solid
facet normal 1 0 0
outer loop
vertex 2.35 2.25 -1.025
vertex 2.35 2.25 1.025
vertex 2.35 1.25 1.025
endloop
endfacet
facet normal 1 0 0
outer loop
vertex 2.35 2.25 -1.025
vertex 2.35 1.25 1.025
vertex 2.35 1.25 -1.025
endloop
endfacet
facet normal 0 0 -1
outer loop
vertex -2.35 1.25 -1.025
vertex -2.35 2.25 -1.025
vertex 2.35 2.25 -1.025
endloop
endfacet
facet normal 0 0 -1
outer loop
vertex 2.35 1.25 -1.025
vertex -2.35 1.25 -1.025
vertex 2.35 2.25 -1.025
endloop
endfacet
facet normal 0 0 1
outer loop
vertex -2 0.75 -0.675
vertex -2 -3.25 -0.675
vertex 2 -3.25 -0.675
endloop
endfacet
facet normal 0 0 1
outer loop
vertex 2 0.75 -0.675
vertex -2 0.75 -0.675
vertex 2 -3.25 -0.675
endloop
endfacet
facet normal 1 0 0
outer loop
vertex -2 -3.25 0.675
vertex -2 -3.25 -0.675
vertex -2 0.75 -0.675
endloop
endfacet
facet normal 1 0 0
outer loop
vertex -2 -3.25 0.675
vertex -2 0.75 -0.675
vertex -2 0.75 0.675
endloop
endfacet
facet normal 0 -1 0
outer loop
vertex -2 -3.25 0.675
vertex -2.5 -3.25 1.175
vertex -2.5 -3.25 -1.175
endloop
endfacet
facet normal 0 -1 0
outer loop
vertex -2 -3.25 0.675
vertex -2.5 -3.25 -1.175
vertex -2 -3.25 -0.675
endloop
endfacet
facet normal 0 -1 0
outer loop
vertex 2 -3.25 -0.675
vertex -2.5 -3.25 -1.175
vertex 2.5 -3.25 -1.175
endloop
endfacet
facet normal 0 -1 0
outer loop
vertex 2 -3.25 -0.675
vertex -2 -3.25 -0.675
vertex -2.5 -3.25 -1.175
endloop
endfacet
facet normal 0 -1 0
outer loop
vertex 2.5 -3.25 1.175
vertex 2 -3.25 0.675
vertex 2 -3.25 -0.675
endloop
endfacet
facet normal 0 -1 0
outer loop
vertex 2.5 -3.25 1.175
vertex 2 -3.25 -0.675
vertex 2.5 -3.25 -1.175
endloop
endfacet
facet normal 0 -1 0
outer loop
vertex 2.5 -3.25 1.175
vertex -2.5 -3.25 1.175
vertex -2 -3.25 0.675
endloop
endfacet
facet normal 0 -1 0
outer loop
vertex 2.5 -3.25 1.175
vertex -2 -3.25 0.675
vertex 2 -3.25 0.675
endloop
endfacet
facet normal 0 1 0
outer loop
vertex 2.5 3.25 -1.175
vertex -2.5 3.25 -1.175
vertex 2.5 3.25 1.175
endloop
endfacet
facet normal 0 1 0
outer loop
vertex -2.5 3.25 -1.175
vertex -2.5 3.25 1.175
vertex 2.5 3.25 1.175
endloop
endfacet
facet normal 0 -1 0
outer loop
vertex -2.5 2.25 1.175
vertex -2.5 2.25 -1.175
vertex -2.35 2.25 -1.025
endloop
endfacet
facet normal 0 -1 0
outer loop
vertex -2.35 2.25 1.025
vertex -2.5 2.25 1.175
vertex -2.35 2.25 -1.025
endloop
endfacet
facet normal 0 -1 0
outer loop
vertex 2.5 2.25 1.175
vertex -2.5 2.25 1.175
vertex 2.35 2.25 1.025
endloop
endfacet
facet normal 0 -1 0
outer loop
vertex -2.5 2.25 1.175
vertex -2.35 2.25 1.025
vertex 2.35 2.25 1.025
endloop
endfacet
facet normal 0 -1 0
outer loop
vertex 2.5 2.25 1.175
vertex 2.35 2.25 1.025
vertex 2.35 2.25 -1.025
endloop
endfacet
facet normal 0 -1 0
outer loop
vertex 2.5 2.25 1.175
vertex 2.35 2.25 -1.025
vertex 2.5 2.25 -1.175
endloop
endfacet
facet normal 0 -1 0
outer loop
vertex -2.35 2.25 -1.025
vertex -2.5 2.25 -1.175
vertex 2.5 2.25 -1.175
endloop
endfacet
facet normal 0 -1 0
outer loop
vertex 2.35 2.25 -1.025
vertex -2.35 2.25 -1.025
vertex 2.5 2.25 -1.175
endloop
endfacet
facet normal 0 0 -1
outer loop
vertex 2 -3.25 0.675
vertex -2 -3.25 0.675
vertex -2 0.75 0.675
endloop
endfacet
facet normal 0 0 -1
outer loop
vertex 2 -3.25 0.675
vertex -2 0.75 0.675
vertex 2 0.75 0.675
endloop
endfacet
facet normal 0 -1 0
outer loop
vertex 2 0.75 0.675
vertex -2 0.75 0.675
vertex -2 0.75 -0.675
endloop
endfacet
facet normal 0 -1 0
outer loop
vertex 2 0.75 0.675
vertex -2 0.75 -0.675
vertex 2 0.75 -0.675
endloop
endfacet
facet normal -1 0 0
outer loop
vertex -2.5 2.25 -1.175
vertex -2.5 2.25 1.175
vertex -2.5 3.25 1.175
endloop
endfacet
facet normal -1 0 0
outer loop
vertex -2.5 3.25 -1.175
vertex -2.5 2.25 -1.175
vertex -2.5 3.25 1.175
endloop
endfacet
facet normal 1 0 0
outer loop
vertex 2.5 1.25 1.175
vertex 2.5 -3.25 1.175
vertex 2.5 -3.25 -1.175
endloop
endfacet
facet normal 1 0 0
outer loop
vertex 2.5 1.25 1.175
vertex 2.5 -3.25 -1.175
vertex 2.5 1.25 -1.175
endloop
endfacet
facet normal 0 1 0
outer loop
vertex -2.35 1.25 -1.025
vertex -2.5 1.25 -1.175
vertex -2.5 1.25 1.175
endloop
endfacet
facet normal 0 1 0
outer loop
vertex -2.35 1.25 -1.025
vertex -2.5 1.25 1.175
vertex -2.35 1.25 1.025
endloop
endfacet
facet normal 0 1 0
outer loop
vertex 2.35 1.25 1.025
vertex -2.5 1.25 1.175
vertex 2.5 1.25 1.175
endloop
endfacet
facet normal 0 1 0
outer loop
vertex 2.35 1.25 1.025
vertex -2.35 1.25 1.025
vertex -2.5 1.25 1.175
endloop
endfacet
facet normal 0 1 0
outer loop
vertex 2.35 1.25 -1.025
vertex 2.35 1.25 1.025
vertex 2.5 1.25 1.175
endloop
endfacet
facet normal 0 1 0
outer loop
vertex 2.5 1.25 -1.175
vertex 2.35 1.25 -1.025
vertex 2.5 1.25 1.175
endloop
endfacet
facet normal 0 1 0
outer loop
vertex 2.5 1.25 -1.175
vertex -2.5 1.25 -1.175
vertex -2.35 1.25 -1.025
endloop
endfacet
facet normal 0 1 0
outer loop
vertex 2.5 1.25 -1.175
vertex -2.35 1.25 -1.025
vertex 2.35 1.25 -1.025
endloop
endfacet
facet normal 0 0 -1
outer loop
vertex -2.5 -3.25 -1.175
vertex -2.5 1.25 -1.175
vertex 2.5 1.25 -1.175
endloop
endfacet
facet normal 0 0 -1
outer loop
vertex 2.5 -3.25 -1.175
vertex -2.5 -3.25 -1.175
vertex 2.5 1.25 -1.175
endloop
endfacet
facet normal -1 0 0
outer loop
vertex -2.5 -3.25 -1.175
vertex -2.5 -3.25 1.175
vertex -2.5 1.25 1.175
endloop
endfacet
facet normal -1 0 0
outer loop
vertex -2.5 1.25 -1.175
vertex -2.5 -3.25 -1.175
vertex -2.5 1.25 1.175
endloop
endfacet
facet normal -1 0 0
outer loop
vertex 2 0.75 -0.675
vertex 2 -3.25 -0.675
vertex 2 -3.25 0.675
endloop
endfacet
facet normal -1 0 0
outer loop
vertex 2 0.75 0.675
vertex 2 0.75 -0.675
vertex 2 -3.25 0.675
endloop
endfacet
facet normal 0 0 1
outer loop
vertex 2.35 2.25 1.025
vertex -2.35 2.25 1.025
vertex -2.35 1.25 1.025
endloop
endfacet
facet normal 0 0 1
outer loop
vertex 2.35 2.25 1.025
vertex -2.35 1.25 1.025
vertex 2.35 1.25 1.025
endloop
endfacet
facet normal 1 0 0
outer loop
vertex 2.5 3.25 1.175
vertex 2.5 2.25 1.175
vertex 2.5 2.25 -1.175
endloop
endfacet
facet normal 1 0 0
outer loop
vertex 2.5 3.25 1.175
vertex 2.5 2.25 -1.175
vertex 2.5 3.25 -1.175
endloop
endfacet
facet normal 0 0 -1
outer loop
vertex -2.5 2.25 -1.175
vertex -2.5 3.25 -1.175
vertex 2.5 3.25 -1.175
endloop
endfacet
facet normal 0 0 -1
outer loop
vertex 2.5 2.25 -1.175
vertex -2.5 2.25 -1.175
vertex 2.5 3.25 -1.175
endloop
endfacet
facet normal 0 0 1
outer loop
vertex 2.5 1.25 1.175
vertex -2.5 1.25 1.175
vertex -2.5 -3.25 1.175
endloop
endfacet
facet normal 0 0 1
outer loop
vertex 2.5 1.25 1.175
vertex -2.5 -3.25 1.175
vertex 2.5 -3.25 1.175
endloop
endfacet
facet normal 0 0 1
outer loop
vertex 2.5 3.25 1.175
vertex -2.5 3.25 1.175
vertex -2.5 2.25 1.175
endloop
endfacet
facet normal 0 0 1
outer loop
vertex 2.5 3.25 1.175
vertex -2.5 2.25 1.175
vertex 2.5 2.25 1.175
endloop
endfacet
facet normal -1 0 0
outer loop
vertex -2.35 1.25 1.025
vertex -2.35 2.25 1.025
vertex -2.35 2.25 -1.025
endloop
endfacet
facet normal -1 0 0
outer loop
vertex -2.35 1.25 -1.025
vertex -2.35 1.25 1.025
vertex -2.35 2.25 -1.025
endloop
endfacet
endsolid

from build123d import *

# Parameters (mm, degrees)
EXTRUDE1_DEPTH      = 1.175
EXTRUDE1_DEPTH_BACK = 1.175
SKETCH1_W           = 5
SKETCH1_H           = 6.5
CUT_EXTRUDE1_START  = -1
SKETCH2_OUTSIDE_W   = 8.706
SKETCH2_OUTSIDE_H   = 6.056
SKETCH2_OUTSIDE_W_2 = 4.7
SKETCH2_OUTSIDE_H_2 = 2.05
CUT_EXTRUDE1_DEPTH  = 1
SKETCH3_W           = 4
SKETCH3_H           = 1.35
CUT_EXTRUDE2_DEPTH  = 4


with BuildPart() as part:
    # Sketch1 → Extrude1 (new, two sides: drawn at the far end of the back side and taken through both)
    with BuildSketch(Plane.XY.offset(-EXTRUDE1_DEPTH_BACK)):
        Rectangle(SKETCH1_W, SKETCH1_H)
    extrude(amount=EXTRUDE1_DEPTH + EXTRUDE1_DEPTH_BACK)

    # Sketch2 outside → Cut-Extrude1 (cut)
    with BuildSketch(Plane(origin=(0, 3.25, 0), x_dir=(1, 0, 0), z_dir=(0, 1, 0)).offset(CUT_EXTRUDE1_START)):
        Rectangle(SKETCH2_OUTSIDE_W, SKETCH2_OUTSIDE_H)
        Rectangle(SKETCH2_OUTSIDE_W_2, SKETCH2_OUTSIDE_H_2, mode=Mode.SUBTRACT)
    extrude(amount=-CUT_EXTRUDE1_DEPTH, mode=Mode.SUBTRACT)

    # Sketch3 → Cut-Extrude2 (cut)
    with BuildSketch(Plane.XZ.offset(3.25)):
        Rectangle(SKETCH3_W, SKETCH3_H)
    extrude(amount=-CUT_EXTRUDE2_DEPTH, mode=Mode.SUBTRACT)


solid = part.part
